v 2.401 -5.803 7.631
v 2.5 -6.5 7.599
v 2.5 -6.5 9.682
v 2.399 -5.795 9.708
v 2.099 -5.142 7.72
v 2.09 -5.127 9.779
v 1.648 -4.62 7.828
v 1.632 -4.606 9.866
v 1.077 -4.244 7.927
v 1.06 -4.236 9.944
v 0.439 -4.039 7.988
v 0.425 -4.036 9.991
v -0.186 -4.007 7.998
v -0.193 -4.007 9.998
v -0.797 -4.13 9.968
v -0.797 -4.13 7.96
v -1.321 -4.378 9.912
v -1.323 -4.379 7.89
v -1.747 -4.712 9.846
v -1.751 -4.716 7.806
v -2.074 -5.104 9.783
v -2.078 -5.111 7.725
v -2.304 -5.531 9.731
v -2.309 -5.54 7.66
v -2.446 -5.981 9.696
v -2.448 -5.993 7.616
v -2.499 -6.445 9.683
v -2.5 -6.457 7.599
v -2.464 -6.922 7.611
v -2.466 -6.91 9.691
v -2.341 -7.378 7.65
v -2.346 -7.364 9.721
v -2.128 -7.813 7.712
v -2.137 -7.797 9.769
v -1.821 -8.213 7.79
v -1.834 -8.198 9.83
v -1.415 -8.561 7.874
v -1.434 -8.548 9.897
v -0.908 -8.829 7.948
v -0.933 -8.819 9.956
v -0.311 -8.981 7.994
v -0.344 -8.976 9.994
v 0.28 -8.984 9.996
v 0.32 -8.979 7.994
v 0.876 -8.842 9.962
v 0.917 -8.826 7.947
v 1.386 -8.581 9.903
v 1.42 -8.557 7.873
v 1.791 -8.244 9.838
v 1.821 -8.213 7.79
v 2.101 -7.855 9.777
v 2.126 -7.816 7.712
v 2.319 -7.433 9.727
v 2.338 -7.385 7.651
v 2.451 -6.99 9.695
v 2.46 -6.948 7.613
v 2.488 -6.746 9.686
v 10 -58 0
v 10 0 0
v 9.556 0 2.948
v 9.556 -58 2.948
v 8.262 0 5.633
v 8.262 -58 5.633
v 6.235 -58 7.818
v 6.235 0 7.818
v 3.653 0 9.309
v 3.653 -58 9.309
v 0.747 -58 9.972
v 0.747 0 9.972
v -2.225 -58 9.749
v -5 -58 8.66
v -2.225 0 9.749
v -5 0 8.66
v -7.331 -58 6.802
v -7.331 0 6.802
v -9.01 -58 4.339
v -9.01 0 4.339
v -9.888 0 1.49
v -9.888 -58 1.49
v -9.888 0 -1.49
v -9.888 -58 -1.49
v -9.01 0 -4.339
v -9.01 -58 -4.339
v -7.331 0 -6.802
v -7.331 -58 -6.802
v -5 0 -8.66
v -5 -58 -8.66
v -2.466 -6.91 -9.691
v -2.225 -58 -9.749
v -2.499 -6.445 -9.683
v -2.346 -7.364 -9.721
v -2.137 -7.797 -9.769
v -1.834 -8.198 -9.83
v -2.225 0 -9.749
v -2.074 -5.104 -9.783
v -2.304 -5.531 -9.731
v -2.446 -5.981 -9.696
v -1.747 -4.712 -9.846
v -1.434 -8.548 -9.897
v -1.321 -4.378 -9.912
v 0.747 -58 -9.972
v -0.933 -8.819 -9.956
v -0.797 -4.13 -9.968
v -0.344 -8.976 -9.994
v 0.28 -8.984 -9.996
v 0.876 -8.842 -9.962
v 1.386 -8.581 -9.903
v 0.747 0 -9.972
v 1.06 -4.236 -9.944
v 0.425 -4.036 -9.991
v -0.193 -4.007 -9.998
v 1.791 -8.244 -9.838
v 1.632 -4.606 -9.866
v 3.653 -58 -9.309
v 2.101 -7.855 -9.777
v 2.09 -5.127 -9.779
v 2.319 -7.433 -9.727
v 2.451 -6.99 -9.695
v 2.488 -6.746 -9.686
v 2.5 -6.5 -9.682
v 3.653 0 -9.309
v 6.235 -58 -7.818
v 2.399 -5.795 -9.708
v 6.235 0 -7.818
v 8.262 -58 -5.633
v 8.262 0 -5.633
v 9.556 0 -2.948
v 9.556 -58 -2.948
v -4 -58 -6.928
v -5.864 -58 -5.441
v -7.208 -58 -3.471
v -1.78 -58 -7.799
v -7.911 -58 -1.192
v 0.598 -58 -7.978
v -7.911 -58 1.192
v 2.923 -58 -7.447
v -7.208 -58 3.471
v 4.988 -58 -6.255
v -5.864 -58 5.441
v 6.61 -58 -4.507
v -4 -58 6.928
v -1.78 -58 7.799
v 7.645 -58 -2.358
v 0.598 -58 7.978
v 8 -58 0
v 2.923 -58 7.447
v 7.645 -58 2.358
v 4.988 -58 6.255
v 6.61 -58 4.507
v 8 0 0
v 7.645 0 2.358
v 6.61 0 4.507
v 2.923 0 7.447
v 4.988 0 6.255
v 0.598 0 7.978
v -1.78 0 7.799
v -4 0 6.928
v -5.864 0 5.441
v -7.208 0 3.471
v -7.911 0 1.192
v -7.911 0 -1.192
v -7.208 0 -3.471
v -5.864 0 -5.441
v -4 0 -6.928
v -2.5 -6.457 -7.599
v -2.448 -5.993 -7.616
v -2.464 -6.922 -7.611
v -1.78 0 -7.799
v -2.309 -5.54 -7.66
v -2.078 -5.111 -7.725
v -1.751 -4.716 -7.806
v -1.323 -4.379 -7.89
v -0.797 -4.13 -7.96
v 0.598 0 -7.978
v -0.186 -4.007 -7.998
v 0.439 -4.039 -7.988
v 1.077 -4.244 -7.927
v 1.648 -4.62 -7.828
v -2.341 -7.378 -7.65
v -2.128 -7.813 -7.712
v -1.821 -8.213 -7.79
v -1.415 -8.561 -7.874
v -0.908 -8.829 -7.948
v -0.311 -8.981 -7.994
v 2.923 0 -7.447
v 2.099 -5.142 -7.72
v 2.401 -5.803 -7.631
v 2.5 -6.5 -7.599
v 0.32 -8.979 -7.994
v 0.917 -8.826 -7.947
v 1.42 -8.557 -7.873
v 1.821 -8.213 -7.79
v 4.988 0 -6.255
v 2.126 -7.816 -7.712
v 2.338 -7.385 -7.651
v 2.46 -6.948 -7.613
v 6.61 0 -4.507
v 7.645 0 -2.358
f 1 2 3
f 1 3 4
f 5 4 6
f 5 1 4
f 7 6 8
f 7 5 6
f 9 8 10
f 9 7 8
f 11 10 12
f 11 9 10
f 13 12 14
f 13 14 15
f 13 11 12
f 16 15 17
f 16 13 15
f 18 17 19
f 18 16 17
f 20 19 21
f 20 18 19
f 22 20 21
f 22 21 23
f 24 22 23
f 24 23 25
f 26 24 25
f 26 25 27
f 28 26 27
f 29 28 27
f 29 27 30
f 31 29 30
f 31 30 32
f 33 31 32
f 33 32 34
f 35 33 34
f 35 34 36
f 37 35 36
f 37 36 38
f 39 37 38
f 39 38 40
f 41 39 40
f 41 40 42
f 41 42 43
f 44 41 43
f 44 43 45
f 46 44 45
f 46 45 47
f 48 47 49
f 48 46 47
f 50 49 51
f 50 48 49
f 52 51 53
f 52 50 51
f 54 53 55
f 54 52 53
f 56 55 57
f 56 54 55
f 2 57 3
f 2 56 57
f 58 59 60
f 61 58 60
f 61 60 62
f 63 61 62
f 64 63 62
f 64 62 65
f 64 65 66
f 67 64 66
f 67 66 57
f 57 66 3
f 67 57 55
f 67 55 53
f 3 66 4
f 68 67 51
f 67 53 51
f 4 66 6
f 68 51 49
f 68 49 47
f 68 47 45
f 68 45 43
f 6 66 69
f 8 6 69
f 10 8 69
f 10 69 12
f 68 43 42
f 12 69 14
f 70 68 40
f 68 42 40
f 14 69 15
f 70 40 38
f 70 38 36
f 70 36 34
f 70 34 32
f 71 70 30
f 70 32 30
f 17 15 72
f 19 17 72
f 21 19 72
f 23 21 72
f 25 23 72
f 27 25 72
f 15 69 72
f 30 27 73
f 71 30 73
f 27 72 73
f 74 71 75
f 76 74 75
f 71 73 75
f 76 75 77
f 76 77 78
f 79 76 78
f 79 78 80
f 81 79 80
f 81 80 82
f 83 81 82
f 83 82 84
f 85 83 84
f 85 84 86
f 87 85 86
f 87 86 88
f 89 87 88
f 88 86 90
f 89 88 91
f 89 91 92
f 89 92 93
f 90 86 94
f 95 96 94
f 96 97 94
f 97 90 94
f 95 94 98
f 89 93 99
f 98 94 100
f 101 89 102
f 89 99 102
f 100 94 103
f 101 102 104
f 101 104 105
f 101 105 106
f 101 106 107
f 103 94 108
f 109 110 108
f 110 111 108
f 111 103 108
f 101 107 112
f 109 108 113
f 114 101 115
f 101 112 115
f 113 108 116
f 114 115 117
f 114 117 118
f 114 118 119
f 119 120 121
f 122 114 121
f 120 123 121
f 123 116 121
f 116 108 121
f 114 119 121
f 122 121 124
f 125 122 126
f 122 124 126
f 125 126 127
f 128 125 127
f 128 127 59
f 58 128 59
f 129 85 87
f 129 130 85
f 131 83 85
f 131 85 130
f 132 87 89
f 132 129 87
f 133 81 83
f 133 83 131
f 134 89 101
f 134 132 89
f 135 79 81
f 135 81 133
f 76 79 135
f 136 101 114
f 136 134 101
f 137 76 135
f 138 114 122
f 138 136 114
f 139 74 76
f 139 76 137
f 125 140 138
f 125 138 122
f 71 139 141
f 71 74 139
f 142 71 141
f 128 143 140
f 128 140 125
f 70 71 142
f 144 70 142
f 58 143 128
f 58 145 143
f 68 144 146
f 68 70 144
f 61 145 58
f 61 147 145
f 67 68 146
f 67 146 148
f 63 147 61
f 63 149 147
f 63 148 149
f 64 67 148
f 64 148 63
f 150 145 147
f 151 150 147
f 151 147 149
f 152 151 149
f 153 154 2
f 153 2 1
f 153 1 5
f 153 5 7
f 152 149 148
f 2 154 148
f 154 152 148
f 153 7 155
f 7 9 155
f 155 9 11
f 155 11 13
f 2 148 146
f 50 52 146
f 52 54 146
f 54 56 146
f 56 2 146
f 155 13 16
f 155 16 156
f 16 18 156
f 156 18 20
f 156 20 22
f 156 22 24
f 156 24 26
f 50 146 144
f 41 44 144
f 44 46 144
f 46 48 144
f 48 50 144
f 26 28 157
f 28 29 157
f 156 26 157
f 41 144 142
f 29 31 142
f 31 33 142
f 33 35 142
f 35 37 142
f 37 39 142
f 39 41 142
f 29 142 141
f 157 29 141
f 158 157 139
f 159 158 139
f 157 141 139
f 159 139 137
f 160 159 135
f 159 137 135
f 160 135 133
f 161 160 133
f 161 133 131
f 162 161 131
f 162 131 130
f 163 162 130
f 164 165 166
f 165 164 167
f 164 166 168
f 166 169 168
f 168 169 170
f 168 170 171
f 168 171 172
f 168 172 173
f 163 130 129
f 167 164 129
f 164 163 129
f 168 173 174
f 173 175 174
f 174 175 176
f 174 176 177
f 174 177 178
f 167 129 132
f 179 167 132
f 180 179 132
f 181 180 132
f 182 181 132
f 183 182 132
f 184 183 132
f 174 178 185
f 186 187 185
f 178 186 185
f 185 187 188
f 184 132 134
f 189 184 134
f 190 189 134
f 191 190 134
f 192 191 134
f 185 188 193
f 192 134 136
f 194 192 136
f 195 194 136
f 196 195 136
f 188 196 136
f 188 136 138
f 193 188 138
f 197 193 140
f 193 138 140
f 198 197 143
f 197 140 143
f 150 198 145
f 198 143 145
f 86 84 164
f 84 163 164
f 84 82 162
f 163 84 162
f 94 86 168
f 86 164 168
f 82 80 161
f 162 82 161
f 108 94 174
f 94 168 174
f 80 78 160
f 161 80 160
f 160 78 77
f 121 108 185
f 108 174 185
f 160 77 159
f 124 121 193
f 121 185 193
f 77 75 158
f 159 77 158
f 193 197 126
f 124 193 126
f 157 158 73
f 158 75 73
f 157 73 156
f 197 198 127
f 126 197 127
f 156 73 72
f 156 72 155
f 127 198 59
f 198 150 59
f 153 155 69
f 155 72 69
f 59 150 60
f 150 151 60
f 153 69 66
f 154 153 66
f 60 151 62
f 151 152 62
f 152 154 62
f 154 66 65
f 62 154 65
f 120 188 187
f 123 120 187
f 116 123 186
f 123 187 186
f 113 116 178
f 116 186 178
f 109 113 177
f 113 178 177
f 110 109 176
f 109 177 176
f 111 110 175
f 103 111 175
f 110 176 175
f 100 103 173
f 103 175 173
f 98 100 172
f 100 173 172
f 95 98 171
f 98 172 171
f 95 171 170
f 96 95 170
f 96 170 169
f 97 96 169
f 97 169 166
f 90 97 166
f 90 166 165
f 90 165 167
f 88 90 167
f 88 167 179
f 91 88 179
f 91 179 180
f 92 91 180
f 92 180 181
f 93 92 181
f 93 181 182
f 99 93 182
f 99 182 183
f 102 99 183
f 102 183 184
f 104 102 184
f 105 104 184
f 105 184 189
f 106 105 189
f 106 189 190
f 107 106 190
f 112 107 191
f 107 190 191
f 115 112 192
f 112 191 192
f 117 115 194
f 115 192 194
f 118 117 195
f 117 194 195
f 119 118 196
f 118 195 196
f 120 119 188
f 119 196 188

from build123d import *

# Parameters (mm, degrees)
F0_R          = 10
F1_DEPTH      = 58
F2_R          = 8
F3_DEPTH      = 60
F4_R          = 2.5
F5_DEPTH      = 25
F5_DEPTH_BACK = 25


with BuildPart() as f1:
    # F0 (on Front) → F1 (new body)
    with BuildSketch(Plane.XZ):
        Circle(F0_R)
    extrude(amount=F1_DEPTH)

    # F2 (on face) → F3 (cut)
    with BuildSketch(Plane.XZ.offset(58)):
        Circle(F2_R)
    extrude(amount=-F3_DEPTH, mode=Mode.SUBTRACT)

    # F4 (on Top) → F5 (cut, two sides)
    with BuildSketch(Plane.XY) as f5_sk:
        with Locations((0, -6.5)):
            Circle(F4_R)
    extrude(amount=-F5_DEPTH, mode=Mode.SUBTRACT)
    extrude(f5_sk.sketch, amount=F5_DEPTH_BACK, mode=Mode.SUBTRACT)


solid = f1.part
